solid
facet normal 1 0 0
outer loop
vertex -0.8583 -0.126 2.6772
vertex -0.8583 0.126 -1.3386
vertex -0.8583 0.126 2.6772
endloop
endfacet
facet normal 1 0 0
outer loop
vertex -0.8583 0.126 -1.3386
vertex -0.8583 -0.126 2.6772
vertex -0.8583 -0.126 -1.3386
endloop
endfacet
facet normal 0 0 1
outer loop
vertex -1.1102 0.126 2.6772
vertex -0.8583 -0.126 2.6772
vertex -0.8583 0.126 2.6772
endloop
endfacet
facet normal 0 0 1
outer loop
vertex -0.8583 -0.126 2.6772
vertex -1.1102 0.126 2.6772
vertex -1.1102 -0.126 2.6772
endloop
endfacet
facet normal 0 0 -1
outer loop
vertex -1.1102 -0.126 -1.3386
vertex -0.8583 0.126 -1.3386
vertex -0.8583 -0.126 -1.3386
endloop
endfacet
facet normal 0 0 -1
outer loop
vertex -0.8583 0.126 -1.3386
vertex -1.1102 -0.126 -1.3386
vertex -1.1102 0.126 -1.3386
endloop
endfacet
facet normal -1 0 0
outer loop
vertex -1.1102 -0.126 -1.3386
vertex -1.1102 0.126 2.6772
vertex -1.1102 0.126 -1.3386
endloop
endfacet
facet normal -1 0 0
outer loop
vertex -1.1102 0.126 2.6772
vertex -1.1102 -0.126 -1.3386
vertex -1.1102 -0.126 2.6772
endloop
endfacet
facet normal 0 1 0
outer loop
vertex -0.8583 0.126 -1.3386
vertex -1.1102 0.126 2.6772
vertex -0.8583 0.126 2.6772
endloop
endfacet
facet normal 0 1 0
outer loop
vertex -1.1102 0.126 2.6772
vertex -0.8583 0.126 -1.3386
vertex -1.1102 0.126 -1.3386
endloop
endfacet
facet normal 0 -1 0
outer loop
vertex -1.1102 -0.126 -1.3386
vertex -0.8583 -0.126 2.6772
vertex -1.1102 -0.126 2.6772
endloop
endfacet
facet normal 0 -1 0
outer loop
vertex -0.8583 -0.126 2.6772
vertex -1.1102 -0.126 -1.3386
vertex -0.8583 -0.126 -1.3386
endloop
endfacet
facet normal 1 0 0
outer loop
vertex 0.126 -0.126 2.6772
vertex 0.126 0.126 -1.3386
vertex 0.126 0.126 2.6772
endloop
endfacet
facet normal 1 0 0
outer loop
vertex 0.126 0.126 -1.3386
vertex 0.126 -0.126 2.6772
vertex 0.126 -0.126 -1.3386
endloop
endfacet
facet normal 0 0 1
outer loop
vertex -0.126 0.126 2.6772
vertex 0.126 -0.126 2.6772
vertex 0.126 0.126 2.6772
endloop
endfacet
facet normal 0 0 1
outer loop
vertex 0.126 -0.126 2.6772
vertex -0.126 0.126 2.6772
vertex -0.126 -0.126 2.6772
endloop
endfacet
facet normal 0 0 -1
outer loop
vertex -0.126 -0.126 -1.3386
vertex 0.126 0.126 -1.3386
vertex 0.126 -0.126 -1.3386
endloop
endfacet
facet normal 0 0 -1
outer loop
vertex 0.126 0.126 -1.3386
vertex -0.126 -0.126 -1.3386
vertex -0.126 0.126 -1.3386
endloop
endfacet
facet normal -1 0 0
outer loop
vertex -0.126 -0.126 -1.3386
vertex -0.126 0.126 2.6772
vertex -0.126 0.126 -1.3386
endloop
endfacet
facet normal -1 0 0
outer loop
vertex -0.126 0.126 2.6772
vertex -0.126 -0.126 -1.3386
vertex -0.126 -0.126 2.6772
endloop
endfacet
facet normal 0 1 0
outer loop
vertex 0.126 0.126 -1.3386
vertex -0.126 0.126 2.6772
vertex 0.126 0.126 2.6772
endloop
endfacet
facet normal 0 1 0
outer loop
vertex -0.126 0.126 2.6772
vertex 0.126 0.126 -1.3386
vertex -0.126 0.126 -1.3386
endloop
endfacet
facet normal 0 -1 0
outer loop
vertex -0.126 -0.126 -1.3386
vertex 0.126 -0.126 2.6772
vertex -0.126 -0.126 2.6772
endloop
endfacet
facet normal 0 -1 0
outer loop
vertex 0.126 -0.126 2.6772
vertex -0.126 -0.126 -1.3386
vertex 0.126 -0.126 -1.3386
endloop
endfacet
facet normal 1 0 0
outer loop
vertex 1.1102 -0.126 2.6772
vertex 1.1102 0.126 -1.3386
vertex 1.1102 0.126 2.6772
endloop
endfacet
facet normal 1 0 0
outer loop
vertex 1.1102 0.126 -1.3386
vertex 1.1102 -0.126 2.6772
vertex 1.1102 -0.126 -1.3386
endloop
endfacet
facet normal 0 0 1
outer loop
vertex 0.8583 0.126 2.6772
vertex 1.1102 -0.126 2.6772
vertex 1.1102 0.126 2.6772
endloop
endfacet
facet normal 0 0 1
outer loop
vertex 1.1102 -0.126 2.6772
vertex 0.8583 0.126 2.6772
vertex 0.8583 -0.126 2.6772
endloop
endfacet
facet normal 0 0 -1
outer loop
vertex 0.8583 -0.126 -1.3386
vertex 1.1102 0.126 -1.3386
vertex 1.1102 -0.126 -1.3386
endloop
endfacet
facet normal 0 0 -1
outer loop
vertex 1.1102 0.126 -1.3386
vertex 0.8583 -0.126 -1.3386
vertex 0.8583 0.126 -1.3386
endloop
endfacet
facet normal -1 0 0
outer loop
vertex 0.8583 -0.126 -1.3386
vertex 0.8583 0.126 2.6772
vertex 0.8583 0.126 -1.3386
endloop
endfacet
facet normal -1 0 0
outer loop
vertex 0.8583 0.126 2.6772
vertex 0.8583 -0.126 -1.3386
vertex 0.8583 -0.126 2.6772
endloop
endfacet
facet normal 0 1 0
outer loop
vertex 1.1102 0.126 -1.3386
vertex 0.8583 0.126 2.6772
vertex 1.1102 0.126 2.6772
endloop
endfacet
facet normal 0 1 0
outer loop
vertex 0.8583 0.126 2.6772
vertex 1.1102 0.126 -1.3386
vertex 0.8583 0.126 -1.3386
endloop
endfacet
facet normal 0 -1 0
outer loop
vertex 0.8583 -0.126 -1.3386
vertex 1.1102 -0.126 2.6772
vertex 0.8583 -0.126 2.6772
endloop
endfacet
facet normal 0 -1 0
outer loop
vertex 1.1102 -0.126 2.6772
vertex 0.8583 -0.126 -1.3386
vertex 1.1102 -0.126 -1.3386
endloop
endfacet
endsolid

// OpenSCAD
// file: defines.scad
// example012.stl is Mblock.stl, (c) 2009 Will Langford
// licensed under the Creative Commons - GNU GPL license.
// http://www.thingiverse.com/thing:753

//import("sim800c.stl", convexity=3);

// PCB

A = 2.5;
B = 10.0;

scale = 1/2.54;
// main file
include <defines.scad>

pitch = 2.5;
p_w = 0.64;
p_h = 7.0;

module Pin(x, y) {
  translate([x - p_w/2, y - p_w/2, -3.4])
    cube(size = [p_w, p_w, p_h + 3.2], center = false);
}

// Pins
scale(scale) color("Silver") {
  Pin(-pitch, 0);
  Pin(     0, 0);
  Pin( pitch, 0);
}
